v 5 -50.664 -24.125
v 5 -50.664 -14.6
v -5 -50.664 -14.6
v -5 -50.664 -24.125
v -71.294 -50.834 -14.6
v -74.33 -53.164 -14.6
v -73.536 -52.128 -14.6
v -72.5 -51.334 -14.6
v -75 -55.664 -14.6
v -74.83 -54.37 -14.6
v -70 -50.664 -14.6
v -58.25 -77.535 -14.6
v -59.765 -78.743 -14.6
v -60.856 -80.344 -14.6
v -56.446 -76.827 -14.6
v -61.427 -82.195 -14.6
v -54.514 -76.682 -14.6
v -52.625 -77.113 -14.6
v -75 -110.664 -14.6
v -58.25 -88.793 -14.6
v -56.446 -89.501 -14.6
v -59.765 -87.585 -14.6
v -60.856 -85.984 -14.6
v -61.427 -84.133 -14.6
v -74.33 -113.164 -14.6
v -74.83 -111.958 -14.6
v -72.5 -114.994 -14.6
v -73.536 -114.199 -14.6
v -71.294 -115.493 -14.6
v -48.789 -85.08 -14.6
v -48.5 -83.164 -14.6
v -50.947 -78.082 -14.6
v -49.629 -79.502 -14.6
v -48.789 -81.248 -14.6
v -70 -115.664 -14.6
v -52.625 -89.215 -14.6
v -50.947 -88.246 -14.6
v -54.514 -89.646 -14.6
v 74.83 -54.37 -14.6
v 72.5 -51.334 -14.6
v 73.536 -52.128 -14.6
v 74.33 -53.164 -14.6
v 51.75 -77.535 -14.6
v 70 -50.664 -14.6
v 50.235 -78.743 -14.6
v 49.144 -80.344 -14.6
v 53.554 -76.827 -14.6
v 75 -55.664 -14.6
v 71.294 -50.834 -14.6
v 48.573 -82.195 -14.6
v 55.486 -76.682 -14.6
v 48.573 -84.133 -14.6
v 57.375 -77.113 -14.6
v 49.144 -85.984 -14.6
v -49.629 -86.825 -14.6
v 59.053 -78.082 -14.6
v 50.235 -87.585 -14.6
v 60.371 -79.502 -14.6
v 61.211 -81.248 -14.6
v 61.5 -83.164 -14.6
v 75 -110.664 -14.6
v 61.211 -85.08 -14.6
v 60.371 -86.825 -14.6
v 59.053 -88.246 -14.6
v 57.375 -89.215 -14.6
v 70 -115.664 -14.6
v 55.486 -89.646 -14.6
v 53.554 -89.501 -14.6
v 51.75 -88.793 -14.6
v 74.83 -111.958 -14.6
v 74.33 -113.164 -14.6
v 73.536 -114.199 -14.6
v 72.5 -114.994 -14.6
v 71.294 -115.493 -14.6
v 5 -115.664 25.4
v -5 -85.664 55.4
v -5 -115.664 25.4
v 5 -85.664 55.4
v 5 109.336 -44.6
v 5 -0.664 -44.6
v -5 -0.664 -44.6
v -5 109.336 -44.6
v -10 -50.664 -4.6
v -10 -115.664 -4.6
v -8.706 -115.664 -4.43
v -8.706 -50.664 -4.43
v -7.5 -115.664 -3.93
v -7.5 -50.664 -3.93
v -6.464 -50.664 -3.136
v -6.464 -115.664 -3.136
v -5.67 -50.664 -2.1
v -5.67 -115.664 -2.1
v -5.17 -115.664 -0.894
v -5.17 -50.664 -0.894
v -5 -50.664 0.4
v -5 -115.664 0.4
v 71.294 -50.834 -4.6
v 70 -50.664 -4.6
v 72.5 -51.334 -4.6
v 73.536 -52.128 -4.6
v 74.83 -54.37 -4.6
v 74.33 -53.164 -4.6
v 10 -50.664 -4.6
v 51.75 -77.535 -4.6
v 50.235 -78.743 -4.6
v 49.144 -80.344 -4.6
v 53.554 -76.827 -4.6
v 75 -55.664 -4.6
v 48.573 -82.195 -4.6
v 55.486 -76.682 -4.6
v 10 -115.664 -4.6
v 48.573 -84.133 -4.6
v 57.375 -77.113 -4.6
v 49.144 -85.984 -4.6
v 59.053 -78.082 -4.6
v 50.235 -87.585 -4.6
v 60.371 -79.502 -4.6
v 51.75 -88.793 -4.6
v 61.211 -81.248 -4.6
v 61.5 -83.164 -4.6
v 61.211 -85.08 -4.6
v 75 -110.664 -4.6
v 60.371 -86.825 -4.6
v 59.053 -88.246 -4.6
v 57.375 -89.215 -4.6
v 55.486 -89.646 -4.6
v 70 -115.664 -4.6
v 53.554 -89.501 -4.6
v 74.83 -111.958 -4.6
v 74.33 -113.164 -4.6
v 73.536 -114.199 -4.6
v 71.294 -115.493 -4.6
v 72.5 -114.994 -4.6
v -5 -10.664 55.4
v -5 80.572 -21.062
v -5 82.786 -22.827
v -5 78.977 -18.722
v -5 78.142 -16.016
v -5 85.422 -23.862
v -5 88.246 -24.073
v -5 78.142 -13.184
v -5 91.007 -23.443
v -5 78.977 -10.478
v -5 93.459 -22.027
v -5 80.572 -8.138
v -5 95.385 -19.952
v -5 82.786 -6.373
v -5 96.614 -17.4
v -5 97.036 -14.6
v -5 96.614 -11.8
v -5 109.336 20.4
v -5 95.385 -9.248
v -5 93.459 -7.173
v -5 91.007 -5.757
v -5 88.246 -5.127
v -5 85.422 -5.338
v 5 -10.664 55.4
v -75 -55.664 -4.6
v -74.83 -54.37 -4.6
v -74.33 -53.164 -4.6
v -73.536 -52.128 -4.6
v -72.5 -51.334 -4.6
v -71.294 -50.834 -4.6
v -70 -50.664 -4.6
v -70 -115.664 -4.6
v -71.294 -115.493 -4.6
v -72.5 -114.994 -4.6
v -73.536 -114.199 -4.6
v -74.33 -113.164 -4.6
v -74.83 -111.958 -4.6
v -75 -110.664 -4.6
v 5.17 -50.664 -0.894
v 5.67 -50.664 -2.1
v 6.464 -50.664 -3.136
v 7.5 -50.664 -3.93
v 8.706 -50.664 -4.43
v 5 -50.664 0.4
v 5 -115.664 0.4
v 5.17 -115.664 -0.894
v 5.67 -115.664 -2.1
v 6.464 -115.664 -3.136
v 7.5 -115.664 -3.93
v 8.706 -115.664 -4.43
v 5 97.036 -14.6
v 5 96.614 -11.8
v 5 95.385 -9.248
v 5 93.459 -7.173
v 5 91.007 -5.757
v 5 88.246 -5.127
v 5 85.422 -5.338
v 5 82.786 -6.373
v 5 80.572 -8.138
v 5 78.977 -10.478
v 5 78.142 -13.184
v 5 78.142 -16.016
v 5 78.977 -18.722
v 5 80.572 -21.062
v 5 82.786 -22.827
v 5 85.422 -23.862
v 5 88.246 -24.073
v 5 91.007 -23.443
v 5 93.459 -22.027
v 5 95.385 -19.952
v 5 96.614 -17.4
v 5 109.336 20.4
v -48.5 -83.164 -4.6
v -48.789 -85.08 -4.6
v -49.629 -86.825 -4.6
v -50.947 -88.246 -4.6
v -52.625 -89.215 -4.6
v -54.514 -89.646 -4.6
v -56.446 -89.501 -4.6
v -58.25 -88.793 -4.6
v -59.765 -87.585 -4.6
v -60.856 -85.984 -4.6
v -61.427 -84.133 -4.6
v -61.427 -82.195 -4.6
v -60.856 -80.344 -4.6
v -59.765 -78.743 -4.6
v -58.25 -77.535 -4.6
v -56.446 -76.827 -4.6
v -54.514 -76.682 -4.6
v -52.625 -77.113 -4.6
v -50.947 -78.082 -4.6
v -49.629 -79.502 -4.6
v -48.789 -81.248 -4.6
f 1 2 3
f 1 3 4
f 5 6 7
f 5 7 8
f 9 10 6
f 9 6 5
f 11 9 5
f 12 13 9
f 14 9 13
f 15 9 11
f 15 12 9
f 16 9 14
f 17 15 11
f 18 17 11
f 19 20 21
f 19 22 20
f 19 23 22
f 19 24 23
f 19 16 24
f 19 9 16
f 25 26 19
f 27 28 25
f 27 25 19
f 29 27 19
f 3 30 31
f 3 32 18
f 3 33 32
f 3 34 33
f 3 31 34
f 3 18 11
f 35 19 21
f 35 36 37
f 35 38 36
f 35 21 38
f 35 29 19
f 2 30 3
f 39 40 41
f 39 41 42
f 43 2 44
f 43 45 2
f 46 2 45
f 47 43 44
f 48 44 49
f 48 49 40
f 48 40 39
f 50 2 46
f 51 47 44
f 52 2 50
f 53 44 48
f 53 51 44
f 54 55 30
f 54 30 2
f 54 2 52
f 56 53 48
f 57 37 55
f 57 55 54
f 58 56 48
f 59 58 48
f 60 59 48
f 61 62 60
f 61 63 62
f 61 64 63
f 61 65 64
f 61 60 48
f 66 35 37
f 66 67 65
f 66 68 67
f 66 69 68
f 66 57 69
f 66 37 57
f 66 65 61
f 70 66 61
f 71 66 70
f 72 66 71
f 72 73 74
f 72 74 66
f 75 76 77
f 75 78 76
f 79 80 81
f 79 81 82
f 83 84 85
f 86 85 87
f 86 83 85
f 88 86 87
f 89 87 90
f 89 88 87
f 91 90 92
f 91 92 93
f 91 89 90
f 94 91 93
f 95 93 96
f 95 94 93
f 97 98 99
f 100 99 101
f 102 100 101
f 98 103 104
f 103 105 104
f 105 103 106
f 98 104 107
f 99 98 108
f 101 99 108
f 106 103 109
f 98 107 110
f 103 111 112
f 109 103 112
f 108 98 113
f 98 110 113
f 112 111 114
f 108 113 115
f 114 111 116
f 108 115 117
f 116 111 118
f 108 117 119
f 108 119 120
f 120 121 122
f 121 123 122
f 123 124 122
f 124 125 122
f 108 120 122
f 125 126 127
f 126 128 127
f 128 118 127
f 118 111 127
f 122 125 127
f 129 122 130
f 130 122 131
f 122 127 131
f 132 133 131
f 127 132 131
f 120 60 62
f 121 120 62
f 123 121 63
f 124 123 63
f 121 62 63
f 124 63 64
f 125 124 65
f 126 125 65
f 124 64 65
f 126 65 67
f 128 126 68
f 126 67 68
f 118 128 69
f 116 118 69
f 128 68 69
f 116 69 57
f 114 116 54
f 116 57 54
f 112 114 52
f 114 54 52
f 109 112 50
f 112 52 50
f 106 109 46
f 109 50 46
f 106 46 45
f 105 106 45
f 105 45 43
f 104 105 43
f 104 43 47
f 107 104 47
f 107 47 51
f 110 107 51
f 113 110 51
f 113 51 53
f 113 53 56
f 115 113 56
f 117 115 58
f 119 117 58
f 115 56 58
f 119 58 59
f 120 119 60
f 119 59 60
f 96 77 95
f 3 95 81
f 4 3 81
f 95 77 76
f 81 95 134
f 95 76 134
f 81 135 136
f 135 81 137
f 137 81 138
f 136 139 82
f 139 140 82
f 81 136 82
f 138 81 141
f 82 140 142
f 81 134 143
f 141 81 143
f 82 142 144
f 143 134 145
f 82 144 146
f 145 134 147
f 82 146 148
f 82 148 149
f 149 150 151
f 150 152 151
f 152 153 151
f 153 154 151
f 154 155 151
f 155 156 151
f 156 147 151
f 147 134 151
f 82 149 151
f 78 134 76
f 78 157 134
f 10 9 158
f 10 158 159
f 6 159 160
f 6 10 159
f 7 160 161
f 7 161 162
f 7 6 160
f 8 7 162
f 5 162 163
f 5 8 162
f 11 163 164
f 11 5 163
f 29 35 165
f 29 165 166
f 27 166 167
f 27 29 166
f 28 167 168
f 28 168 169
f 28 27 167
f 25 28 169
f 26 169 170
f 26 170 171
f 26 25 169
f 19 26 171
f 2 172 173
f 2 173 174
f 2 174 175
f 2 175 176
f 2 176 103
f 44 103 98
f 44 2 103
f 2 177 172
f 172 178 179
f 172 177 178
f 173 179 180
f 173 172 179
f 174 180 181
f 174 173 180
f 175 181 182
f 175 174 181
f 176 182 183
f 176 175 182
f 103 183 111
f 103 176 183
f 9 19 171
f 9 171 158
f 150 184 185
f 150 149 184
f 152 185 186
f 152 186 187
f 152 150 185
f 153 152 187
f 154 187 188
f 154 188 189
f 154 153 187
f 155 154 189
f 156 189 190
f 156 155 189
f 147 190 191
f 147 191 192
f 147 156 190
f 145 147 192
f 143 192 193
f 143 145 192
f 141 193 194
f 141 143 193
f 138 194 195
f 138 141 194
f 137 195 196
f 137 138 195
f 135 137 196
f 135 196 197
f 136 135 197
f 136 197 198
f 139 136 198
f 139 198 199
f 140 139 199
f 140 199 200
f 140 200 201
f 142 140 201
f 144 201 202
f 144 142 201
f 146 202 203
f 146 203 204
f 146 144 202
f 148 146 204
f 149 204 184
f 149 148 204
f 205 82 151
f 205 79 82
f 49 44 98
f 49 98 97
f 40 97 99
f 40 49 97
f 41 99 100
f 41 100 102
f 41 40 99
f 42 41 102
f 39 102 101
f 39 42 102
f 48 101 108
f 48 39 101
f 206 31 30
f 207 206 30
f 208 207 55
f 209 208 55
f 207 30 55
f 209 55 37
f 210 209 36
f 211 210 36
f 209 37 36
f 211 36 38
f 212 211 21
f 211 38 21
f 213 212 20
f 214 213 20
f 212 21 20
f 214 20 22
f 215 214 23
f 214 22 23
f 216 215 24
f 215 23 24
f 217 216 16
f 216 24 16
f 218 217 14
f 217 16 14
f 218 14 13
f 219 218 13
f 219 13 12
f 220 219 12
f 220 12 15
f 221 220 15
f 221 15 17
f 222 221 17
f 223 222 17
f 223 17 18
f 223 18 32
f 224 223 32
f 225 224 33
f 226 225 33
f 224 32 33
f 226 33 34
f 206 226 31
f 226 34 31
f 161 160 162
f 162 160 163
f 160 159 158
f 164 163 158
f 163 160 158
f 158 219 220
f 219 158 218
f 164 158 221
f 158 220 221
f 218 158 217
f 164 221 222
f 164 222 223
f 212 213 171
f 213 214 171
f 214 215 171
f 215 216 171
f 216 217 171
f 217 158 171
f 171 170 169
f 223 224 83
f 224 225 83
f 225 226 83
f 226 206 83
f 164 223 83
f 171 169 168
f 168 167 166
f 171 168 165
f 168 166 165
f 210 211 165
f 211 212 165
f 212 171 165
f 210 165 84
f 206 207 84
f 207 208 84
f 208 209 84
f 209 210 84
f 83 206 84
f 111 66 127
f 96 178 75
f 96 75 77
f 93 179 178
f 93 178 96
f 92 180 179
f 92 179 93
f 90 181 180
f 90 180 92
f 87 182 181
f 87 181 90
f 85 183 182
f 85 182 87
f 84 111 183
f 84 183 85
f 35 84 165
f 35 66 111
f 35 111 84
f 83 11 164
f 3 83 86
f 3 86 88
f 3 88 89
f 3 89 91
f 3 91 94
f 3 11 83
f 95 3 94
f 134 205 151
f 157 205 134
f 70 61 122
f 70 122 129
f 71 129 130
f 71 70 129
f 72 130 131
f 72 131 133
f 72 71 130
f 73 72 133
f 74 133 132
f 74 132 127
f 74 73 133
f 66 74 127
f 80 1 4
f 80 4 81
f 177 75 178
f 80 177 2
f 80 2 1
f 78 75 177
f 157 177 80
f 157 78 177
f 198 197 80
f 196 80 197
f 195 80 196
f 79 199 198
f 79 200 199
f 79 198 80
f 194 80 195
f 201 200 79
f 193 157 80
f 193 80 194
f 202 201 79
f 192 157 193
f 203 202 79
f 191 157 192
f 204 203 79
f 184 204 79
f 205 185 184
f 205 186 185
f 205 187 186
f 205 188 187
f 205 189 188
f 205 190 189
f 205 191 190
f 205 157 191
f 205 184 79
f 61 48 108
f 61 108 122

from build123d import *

# Parameters (mm, degrees)
F0_R     = 9.5
F1_DEPTH = 5
F2_R     = 6.5
F2_W     = 10
F2_H     = 65
F3_DEPTH = 10
F4_R     = 5


with BuildPart() as f1:
    # F0 (on Right) → F1 (new body, symmetric)
    with BuildSketch(Plane.YZ):
        Polygon((-115.6638563656, 25.4), (-115.6638563656, -14.6), (-50.6638563656, -14.6), (-50.6638563656, -24.125), (-0.6638563656, -44.6), (109.3361436344, -44.6), (109.3361436344, 20.4), (-10.6638563656, 55.4), (-85.6638563656, 55.4), align=None)
        with Locations((87.5361436344, -14.6)):
            Circle(F0_R, mode=Mode.SUBTRACT)
    extrude(amount=F1_DEPTH, both=True)

    # F2 (on face) → F3 (join)
    with BuildSketch(Plane(origin=(0, 0, -14.6), x_dir=(1, 0, 0), z_dir=(0, 0, -1))):
        with BuildLine():
            ThreePointArc((-75, 55.6638563656), (-73.5355339059, 52.1283224597), (-70, 50.6638563656))
            Line((-70, 50.6638563656), (-5, 50.6638563656))
            Line((-5, 50.6638563656), (-5, 115.6638563656))
            Line((-5, 115.6638563656), (-70, 115.6638563656))
            ThreePointArc((-70, 115.6638563656), (-73.5355339059, 114.1993902716), (-75, 110.6638563656))
            Line((-75, 110.6638563656), (-75, 55.6638563656))
        make_face()
        with Locations((-55, 83.1638563656)):
            Circle(F2_R, mode=Mode.SUBTRACT)
        with Locations((0, 83.1638563656)):
            Rectangle(F2_W, F2_H)
        with BuildLine():
            Line((5, 115.6638563656), (5, 50.6638563656))
            Line((5, 50.6638563656), (70, 50.6638563656))
            ThreePointArc((70, 50.6638563656), (73.5355339059, 52.1283224597), (75, 55.6638563656))
            Line((75, 55.6638563656), (75, 110.6638563656))
            ThreePointArc((75, 110.6638563656), (73.5355339059, 114.1993902716), (70, 115.6638563656))
            Line((70, 115.6638563656), (5, 115.6638563656))
        make_face()
        with Locations((55, 83.1638563656)):
            Circle(F2_R, mode=Mode.SUBTRACT)
    extrude(amount=-F3_DEPTH)

    # F4
    f4_edges = [f1.edges().sort_by_distance(p)[0] for p in [
        (5, -83.163856, -4.6),
        (-5, -83.163856, -4.6),
    ]]
    fillet(f4_edges, radius=F4_R)


solid = f1.part
